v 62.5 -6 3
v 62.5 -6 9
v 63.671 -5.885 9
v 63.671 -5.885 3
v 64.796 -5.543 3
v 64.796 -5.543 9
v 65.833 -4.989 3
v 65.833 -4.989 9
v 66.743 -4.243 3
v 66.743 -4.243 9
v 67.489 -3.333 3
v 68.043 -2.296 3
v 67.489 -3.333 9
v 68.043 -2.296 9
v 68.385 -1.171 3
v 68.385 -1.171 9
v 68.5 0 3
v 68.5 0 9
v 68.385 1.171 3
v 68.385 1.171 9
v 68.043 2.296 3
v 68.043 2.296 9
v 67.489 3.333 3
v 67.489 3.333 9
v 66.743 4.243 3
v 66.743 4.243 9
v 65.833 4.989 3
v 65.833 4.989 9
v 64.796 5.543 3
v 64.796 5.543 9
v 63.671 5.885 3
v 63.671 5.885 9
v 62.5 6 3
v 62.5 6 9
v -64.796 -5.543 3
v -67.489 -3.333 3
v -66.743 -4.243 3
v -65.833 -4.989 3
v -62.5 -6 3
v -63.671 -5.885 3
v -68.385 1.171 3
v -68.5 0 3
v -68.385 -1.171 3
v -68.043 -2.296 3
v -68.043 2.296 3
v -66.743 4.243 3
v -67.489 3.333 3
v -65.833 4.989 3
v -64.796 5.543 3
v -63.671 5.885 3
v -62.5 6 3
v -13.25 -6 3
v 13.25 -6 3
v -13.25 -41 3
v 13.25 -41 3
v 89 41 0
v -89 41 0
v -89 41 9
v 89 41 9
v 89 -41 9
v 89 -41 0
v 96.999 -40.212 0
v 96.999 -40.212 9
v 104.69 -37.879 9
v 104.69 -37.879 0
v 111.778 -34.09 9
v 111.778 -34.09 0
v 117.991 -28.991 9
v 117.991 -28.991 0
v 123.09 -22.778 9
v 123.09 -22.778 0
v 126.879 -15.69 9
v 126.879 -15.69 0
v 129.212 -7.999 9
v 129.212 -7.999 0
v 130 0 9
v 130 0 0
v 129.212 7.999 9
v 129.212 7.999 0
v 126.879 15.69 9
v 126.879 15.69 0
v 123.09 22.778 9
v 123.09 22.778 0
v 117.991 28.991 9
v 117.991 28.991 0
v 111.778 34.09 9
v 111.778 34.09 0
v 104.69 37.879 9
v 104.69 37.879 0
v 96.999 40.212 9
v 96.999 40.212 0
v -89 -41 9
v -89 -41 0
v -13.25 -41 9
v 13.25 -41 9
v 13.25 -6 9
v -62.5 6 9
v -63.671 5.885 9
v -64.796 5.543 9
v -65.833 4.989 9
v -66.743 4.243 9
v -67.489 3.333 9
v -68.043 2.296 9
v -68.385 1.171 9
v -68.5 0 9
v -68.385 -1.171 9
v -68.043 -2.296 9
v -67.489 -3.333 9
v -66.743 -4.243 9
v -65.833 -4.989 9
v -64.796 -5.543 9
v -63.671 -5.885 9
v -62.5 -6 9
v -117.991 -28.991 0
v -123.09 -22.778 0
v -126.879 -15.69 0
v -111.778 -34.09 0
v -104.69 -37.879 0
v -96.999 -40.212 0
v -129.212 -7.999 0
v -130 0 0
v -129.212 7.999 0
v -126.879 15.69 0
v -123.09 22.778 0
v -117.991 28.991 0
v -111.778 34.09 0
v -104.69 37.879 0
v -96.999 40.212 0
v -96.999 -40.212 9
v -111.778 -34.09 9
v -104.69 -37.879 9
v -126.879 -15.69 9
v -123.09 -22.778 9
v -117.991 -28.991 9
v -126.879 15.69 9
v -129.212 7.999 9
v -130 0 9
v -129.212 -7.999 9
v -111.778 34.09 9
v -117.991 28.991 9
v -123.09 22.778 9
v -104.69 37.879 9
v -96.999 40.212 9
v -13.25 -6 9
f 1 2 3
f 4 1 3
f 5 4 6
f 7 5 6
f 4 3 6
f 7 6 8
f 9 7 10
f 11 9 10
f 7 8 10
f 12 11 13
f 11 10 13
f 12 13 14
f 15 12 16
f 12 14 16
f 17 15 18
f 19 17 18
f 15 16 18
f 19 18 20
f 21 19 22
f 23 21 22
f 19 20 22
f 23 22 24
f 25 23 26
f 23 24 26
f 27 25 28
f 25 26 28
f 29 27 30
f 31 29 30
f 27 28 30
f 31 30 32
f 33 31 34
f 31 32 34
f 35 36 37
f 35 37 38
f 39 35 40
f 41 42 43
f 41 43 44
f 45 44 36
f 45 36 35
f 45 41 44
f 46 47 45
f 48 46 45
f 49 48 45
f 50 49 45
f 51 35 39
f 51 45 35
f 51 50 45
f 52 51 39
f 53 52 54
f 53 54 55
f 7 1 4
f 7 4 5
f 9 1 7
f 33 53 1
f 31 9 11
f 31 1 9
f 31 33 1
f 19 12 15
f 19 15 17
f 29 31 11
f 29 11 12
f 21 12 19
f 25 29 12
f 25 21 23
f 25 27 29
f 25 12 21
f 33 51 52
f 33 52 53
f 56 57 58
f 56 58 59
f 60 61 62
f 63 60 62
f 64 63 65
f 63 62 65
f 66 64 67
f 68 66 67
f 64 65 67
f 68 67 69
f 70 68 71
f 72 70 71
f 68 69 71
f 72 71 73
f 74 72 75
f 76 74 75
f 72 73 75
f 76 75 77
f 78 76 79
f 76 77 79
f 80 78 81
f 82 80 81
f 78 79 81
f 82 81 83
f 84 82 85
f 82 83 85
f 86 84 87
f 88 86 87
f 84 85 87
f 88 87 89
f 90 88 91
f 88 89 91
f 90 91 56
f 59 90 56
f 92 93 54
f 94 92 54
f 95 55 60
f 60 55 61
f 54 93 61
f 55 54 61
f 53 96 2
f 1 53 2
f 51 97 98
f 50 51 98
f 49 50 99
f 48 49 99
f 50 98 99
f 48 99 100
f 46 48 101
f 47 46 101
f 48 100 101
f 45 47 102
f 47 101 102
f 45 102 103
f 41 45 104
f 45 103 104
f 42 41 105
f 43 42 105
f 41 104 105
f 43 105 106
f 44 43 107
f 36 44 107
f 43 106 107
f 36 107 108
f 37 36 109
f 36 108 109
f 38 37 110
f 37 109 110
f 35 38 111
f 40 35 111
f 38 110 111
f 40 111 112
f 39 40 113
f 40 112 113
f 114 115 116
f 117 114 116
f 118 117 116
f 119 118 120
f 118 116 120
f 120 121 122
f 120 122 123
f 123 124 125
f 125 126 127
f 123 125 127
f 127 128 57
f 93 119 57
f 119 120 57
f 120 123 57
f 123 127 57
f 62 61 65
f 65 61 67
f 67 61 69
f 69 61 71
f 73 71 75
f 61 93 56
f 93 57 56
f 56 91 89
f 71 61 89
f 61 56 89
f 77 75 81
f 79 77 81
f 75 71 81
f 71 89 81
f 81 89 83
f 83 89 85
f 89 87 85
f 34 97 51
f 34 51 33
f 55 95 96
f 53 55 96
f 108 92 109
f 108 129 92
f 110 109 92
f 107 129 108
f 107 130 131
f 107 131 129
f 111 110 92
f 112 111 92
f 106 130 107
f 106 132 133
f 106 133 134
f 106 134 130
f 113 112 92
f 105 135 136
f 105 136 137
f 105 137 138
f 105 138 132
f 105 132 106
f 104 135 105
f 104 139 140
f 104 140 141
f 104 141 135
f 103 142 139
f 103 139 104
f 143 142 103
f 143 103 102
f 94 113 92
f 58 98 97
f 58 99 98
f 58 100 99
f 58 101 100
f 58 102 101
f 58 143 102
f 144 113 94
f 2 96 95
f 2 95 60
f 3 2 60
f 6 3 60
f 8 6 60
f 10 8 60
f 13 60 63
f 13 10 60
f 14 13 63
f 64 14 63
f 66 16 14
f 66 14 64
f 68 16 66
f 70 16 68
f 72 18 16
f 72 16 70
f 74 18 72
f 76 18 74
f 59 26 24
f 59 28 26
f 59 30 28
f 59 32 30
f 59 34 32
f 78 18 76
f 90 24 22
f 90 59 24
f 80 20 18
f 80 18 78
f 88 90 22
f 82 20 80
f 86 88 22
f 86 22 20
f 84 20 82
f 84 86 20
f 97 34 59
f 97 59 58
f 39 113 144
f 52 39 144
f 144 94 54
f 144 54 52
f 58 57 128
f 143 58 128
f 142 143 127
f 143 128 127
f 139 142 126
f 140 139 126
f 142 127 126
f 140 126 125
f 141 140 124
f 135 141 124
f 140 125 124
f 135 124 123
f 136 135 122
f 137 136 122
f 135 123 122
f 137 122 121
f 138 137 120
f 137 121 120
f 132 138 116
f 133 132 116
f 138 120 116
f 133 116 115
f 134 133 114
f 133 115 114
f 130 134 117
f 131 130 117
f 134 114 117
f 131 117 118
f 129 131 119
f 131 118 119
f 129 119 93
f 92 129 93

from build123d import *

# Parameters (mm, degrees)
PAD_DEPTH       = 9
POCKET_DEPTH    = 6
SKETCH002_W     = 26.5
SKETCH002_H     = 35
POCKET001_DEPTH = 6


with BuildPart() as part:
    # Sketch → Pad (new body)
    with BuildSketch(Plane.XY):
        with BuildLine():
            ThreePointArc((-89, 41), (-130, 0), (-89, -41))
            Line((-89, -41), (89, -41))
            ThreePointArc((89, -41), (130, 0), (89, 41))
            Line((-89, 41), (89, 41))
        make_face()
    extrude(amount=PAD_DEPTH)

    # Sketch001 (on Face6 of Pad) → Pocket (cut)
    with BuildSketch(Plane.XY.offset(9)):
        with BuildLine():
            ThreePointArc((-62.5, 6), (-68.5, 0), (-62.5, -6))
            Line((-62.5, -6), (62.5, -6))
            ThreePointArc((62.5, -6), (68.5, 0), (62.5, 6))
            Line((-62.5, 6), (62.5, 6))
        make_face()
    extrude(amount=-POCKET_DEPTH, mode=Mode.SUBTRACT)

    # Sketch002 (on Face5 of Pocket) → Pocket001 (cut)
    with BuildSketch(Plane.XY.offset(9)):
        with Locations((0, -23.5)):
            Rectangle(SKETCH002_W, SKETCH002_H)
    extrude(amount=-POCKET001_DEPTH, mode=Mode.SUBTRACT)


solid = part.part
